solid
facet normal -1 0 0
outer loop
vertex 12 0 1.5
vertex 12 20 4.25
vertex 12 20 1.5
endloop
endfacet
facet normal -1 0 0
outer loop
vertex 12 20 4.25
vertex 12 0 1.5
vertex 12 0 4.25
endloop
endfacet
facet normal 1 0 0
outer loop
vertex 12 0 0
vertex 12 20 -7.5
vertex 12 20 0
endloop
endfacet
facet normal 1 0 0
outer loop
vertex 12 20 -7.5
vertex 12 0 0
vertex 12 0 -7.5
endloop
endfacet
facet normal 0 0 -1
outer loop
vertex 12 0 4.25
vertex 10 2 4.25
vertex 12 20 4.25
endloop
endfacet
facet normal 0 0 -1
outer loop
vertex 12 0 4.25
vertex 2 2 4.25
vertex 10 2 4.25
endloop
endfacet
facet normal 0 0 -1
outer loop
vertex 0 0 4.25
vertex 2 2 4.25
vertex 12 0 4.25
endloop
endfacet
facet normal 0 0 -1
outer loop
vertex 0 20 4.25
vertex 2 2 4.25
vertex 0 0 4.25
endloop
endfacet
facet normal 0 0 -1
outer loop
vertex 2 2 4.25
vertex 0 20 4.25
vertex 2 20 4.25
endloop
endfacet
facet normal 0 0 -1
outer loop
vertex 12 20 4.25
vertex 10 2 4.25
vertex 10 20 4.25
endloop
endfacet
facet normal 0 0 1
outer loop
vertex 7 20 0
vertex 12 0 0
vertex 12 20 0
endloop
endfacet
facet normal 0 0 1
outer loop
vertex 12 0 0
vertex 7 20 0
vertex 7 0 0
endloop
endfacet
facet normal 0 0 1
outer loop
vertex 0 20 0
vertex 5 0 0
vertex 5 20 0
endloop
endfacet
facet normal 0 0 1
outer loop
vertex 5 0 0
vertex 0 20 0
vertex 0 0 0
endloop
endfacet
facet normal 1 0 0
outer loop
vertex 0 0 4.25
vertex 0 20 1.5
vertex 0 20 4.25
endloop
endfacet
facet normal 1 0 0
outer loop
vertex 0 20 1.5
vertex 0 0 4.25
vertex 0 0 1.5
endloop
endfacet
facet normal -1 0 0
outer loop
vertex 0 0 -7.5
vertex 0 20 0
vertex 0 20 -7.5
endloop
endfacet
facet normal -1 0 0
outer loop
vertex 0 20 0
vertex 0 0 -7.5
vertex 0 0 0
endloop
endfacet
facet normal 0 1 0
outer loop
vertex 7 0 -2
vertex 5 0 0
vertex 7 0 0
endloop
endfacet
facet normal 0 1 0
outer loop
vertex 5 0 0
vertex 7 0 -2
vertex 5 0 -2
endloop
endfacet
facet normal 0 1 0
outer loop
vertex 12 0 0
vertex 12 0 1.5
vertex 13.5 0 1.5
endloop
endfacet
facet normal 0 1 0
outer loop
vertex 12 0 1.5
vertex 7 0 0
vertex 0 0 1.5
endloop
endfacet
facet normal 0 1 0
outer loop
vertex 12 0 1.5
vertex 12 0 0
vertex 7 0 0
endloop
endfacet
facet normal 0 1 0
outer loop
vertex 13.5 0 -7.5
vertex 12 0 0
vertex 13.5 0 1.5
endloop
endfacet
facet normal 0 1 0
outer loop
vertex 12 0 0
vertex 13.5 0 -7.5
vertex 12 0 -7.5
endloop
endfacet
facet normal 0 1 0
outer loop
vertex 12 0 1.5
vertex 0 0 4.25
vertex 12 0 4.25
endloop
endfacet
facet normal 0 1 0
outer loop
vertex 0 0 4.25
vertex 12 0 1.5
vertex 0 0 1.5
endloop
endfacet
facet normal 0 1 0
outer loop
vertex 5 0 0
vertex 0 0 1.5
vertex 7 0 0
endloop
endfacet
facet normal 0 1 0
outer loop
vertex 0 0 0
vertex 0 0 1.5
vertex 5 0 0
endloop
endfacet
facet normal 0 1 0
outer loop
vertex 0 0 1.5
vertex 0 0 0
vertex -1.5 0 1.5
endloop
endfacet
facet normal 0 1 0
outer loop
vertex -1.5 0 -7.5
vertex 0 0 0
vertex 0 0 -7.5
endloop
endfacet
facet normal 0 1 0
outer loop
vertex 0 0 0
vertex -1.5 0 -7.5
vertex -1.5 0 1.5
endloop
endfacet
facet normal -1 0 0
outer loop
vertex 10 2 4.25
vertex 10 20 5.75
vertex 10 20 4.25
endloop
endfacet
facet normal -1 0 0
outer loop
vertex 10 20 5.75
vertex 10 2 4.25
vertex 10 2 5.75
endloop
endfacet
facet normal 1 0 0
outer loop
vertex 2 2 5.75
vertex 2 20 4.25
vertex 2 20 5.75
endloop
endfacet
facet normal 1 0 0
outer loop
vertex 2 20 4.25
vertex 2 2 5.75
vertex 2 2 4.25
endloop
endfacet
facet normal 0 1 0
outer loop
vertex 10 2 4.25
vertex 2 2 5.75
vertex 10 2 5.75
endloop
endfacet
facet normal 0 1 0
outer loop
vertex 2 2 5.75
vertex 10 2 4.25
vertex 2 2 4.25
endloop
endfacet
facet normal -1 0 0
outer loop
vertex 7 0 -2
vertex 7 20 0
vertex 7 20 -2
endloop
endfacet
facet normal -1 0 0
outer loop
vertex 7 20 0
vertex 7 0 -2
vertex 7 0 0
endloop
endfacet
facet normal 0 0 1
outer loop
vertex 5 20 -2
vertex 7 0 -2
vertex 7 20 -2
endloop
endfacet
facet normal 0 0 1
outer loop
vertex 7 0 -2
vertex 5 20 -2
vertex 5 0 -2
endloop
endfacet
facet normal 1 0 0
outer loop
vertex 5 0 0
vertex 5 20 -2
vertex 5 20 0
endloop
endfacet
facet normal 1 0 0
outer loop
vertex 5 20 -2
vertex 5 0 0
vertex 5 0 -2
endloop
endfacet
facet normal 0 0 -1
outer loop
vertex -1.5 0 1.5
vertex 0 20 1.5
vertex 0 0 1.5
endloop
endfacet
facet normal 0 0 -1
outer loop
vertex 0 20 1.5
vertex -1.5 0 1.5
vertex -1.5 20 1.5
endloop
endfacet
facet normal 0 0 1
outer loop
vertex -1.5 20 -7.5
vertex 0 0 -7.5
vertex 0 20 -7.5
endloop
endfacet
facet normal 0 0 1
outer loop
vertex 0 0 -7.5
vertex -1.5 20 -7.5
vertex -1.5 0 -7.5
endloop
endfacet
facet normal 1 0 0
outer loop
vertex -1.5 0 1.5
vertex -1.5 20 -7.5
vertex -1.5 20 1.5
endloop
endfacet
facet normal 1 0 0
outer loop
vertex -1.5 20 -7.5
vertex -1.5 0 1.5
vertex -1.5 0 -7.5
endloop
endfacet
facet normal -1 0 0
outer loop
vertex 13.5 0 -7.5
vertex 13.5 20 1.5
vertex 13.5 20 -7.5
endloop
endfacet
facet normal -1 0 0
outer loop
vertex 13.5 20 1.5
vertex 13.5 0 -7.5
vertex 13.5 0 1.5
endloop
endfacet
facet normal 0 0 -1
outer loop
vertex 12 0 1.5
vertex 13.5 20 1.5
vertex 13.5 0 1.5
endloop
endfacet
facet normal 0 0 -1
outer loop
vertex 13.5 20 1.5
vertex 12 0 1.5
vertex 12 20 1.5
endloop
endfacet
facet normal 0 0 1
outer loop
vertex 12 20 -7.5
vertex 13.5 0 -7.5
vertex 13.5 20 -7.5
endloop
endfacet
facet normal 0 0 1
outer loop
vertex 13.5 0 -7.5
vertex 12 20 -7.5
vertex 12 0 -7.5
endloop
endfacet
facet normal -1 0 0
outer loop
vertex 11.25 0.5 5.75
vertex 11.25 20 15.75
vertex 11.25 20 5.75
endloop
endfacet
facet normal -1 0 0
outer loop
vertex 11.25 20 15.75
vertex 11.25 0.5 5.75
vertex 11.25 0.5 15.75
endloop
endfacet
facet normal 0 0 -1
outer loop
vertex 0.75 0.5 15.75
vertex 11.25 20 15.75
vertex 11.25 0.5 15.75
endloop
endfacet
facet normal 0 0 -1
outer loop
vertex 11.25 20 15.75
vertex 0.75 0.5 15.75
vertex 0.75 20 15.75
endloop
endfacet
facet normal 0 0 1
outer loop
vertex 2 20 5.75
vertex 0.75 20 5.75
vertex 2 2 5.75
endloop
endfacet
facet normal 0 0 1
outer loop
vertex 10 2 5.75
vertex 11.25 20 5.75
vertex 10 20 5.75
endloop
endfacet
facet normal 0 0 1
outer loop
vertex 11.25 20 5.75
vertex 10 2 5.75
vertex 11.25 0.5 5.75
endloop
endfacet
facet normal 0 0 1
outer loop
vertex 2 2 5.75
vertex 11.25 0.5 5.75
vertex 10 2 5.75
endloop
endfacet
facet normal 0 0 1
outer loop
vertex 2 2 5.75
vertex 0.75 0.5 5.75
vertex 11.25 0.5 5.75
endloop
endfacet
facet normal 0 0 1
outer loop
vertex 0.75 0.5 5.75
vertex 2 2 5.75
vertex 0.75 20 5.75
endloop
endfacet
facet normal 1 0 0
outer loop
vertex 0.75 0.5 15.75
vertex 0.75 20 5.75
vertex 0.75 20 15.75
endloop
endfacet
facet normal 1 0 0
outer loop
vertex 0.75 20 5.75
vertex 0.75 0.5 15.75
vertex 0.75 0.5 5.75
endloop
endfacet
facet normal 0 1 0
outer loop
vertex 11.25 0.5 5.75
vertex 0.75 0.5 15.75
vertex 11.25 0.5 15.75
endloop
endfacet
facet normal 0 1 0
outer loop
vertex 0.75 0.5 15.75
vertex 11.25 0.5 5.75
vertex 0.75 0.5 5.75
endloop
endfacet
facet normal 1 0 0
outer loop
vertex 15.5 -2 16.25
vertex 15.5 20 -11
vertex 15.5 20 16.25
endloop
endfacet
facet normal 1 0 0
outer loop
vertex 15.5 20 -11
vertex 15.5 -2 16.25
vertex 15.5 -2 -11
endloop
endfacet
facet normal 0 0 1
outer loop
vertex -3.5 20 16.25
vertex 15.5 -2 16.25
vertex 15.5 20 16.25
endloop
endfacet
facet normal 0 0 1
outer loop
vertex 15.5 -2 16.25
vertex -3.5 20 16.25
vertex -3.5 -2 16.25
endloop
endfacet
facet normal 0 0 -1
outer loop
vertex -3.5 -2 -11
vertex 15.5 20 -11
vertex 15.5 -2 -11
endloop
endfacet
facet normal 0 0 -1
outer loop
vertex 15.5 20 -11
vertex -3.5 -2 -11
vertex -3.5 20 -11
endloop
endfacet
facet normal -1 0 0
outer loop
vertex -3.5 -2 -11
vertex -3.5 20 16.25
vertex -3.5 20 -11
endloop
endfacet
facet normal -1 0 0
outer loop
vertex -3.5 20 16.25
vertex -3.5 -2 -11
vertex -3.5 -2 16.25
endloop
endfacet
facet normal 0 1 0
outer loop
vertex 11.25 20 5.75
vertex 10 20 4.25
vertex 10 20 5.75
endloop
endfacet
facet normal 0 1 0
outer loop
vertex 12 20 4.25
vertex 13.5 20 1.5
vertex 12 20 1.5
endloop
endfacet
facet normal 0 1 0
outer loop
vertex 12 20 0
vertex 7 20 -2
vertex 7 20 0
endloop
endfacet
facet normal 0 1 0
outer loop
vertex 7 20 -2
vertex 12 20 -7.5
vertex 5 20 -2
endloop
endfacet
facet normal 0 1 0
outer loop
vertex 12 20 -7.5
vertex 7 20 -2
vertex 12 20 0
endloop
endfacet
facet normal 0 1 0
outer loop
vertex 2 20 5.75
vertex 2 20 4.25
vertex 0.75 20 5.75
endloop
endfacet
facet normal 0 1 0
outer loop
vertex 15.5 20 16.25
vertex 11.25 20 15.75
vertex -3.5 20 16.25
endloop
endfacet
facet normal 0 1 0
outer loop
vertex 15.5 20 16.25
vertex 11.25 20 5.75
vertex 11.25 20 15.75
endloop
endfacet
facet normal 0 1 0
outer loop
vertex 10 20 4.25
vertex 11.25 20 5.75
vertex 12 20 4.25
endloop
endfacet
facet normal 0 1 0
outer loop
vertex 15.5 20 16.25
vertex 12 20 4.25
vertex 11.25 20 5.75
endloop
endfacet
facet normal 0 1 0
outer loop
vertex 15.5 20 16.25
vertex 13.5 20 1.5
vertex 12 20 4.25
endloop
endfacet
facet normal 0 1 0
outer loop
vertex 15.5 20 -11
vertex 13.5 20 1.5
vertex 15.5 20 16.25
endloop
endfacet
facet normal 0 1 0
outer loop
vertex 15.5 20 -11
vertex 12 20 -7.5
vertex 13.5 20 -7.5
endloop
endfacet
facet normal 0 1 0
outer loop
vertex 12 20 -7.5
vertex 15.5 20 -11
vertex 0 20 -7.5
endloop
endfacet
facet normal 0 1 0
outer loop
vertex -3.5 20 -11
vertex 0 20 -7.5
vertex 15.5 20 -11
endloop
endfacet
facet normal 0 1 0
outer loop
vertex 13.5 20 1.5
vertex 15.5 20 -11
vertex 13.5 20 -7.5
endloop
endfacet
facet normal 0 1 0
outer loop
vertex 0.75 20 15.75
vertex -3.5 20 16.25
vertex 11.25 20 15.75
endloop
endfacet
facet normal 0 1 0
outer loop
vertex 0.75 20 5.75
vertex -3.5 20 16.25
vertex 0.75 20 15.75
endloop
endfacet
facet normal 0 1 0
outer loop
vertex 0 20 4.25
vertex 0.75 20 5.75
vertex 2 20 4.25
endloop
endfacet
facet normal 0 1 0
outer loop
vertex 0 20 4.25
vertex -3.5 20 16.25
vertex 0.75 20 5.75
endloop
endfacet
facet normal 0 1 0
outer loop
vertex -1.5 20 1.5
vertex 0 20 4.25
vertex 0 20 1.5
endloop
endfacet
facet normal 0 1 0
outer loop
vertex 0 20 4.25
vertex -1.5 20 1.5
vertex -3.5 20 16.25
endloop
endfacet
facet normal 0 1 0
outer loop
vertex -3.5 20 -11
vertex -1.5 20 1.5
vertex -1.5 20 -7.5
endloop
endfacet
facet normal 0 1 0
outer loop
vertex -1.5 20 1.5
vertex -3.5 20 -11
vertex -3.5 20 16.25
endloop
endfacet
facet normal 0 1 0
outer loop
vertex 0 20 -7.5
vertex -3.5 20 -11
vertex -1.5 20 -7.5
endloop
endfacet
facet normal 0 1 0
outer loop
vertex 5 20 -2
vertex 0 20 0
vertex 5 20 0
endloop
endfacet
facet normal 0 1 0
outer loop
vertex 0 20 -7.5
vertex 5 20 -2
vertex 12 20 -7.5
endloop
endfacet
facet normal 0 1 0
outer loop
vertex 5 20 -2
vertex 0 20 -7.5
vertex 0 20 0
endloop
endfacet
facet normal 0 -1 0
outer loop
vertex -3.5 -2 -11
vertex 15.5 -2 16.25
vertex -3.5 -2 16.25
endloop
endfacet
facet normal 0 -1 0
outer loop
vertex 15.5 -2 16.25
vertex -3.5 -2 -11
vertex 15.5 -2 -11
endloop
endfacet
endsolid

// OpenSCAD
//test piece for button slide ins


buttonVoidTest();


module buttonShape(){
    
    buttonDepthPadding = 5; //allowance to make 'slide in' work
    buttonHeight = 4.25; //includes small black circle son top of button - at 4 corners
    buttonWidth = 12; //at 12 the y-axis fit is a bit tight, but holds firm. add 0.5 for looser fit
    buttonDepth = buttonWidth + 10; //extra dimension for cutting through back wall - to allow 'slide in'

    buttonPegWidth = 2;
    buttonPegHeight = 2;

    buttonLegWidth = 1.5;
    buttonLegHeight = 4 + buttonDepthPadding; //mesaured at 4, +x for extra working room
    buttonLegOverlap = 1.5; //amount of metal in button body in Z direction

    buttonTopEdgeWidth = 2; //space between edge and bewginning of button mechanism that is depressed
    buttonTopMechanismRidgeWidth = 1; //distance between outer diameter of button depression mechaism and stem
    buttonTopMechanismWidth = buttonWidth - buttonTopEdgeWidth*2;
    buttonTopMechanismDepth = buttonDepth - buttonTopEdgeWidth; //buttonTopMechanismWidth + buttonDepthPadding;
    buttonTopMechanismHeight = 10;
    
    //button stem then has button clipped on, making it full width of base.
    buttomStemHeight = 1.5; //z space betwen button mechanism base and bottom of button top (what is pressed)
    buttonTopWidth = 10.5; //meaured at 10
    buttonTopHeight = 3.5; //measured at 3.17 - this hsoudl really be open to air anyway in the z direction
    buttonTopYsetback = 0.5;
    
    //main button body
    cube([buttonWidth,buttonDepth,buttonHeight]);

    //button circle base
    translate([buttonTopEdgeWidth,buttonTopEdgeWidth,buttonHeight]){
        cube([buttonTopMechanismWidth,buttonTopMechanismDepth,buttonTopMechanismHeight]);
    }

    //space for little pegs on bottom of button
    translate([buttonWidth/2 - buttonPegWidth/2,0,-buttonPegHeight]){
        cube([buttonPegWidth,buttonDepth,buttonPegHeight]);
    }

    //left button legs
    translate([-buttonLegWidth,0,-buttonLegHeight+buttonLegOverlap]){
        cube([buttonLegWidth,buttonDepth,buttonLegHeight]);
    }
    //right button legs
    translate([buttonWidth,0,-buttonLegHeight+buttonLegOverlap]){
        cube([buttonLegWidth,buttonDepth,buttonLegHeight]);
    }
    
    //button top
    translate([buttonWidth/2-buttonTopWidth/2,buttonTopYsetback,buttonHeight+buttomStemHeight]){
        cube([buttonTopWidth,buttonTopMechanismDepth,buttonTopMechanismHeight]);
    }
}

module buttonVoidTest(){
    difference(){
        translate([-3.5,-2,-11]){
            cube([12 + 3 + 2*2,22,9+4.25+10+2*2]);
        }
        //translate([-(buttonLegWidth + 2),-2,-(buttonLegHeight+2)]){
        //    cube([buttonWidth + buttonLegWidth*2 + 2*2,buttonDepth,buttonLegHeight+buttonHeight+buttonTopMechanismHeight+2*2]);
        //}

        buttonShape();
    }
}
